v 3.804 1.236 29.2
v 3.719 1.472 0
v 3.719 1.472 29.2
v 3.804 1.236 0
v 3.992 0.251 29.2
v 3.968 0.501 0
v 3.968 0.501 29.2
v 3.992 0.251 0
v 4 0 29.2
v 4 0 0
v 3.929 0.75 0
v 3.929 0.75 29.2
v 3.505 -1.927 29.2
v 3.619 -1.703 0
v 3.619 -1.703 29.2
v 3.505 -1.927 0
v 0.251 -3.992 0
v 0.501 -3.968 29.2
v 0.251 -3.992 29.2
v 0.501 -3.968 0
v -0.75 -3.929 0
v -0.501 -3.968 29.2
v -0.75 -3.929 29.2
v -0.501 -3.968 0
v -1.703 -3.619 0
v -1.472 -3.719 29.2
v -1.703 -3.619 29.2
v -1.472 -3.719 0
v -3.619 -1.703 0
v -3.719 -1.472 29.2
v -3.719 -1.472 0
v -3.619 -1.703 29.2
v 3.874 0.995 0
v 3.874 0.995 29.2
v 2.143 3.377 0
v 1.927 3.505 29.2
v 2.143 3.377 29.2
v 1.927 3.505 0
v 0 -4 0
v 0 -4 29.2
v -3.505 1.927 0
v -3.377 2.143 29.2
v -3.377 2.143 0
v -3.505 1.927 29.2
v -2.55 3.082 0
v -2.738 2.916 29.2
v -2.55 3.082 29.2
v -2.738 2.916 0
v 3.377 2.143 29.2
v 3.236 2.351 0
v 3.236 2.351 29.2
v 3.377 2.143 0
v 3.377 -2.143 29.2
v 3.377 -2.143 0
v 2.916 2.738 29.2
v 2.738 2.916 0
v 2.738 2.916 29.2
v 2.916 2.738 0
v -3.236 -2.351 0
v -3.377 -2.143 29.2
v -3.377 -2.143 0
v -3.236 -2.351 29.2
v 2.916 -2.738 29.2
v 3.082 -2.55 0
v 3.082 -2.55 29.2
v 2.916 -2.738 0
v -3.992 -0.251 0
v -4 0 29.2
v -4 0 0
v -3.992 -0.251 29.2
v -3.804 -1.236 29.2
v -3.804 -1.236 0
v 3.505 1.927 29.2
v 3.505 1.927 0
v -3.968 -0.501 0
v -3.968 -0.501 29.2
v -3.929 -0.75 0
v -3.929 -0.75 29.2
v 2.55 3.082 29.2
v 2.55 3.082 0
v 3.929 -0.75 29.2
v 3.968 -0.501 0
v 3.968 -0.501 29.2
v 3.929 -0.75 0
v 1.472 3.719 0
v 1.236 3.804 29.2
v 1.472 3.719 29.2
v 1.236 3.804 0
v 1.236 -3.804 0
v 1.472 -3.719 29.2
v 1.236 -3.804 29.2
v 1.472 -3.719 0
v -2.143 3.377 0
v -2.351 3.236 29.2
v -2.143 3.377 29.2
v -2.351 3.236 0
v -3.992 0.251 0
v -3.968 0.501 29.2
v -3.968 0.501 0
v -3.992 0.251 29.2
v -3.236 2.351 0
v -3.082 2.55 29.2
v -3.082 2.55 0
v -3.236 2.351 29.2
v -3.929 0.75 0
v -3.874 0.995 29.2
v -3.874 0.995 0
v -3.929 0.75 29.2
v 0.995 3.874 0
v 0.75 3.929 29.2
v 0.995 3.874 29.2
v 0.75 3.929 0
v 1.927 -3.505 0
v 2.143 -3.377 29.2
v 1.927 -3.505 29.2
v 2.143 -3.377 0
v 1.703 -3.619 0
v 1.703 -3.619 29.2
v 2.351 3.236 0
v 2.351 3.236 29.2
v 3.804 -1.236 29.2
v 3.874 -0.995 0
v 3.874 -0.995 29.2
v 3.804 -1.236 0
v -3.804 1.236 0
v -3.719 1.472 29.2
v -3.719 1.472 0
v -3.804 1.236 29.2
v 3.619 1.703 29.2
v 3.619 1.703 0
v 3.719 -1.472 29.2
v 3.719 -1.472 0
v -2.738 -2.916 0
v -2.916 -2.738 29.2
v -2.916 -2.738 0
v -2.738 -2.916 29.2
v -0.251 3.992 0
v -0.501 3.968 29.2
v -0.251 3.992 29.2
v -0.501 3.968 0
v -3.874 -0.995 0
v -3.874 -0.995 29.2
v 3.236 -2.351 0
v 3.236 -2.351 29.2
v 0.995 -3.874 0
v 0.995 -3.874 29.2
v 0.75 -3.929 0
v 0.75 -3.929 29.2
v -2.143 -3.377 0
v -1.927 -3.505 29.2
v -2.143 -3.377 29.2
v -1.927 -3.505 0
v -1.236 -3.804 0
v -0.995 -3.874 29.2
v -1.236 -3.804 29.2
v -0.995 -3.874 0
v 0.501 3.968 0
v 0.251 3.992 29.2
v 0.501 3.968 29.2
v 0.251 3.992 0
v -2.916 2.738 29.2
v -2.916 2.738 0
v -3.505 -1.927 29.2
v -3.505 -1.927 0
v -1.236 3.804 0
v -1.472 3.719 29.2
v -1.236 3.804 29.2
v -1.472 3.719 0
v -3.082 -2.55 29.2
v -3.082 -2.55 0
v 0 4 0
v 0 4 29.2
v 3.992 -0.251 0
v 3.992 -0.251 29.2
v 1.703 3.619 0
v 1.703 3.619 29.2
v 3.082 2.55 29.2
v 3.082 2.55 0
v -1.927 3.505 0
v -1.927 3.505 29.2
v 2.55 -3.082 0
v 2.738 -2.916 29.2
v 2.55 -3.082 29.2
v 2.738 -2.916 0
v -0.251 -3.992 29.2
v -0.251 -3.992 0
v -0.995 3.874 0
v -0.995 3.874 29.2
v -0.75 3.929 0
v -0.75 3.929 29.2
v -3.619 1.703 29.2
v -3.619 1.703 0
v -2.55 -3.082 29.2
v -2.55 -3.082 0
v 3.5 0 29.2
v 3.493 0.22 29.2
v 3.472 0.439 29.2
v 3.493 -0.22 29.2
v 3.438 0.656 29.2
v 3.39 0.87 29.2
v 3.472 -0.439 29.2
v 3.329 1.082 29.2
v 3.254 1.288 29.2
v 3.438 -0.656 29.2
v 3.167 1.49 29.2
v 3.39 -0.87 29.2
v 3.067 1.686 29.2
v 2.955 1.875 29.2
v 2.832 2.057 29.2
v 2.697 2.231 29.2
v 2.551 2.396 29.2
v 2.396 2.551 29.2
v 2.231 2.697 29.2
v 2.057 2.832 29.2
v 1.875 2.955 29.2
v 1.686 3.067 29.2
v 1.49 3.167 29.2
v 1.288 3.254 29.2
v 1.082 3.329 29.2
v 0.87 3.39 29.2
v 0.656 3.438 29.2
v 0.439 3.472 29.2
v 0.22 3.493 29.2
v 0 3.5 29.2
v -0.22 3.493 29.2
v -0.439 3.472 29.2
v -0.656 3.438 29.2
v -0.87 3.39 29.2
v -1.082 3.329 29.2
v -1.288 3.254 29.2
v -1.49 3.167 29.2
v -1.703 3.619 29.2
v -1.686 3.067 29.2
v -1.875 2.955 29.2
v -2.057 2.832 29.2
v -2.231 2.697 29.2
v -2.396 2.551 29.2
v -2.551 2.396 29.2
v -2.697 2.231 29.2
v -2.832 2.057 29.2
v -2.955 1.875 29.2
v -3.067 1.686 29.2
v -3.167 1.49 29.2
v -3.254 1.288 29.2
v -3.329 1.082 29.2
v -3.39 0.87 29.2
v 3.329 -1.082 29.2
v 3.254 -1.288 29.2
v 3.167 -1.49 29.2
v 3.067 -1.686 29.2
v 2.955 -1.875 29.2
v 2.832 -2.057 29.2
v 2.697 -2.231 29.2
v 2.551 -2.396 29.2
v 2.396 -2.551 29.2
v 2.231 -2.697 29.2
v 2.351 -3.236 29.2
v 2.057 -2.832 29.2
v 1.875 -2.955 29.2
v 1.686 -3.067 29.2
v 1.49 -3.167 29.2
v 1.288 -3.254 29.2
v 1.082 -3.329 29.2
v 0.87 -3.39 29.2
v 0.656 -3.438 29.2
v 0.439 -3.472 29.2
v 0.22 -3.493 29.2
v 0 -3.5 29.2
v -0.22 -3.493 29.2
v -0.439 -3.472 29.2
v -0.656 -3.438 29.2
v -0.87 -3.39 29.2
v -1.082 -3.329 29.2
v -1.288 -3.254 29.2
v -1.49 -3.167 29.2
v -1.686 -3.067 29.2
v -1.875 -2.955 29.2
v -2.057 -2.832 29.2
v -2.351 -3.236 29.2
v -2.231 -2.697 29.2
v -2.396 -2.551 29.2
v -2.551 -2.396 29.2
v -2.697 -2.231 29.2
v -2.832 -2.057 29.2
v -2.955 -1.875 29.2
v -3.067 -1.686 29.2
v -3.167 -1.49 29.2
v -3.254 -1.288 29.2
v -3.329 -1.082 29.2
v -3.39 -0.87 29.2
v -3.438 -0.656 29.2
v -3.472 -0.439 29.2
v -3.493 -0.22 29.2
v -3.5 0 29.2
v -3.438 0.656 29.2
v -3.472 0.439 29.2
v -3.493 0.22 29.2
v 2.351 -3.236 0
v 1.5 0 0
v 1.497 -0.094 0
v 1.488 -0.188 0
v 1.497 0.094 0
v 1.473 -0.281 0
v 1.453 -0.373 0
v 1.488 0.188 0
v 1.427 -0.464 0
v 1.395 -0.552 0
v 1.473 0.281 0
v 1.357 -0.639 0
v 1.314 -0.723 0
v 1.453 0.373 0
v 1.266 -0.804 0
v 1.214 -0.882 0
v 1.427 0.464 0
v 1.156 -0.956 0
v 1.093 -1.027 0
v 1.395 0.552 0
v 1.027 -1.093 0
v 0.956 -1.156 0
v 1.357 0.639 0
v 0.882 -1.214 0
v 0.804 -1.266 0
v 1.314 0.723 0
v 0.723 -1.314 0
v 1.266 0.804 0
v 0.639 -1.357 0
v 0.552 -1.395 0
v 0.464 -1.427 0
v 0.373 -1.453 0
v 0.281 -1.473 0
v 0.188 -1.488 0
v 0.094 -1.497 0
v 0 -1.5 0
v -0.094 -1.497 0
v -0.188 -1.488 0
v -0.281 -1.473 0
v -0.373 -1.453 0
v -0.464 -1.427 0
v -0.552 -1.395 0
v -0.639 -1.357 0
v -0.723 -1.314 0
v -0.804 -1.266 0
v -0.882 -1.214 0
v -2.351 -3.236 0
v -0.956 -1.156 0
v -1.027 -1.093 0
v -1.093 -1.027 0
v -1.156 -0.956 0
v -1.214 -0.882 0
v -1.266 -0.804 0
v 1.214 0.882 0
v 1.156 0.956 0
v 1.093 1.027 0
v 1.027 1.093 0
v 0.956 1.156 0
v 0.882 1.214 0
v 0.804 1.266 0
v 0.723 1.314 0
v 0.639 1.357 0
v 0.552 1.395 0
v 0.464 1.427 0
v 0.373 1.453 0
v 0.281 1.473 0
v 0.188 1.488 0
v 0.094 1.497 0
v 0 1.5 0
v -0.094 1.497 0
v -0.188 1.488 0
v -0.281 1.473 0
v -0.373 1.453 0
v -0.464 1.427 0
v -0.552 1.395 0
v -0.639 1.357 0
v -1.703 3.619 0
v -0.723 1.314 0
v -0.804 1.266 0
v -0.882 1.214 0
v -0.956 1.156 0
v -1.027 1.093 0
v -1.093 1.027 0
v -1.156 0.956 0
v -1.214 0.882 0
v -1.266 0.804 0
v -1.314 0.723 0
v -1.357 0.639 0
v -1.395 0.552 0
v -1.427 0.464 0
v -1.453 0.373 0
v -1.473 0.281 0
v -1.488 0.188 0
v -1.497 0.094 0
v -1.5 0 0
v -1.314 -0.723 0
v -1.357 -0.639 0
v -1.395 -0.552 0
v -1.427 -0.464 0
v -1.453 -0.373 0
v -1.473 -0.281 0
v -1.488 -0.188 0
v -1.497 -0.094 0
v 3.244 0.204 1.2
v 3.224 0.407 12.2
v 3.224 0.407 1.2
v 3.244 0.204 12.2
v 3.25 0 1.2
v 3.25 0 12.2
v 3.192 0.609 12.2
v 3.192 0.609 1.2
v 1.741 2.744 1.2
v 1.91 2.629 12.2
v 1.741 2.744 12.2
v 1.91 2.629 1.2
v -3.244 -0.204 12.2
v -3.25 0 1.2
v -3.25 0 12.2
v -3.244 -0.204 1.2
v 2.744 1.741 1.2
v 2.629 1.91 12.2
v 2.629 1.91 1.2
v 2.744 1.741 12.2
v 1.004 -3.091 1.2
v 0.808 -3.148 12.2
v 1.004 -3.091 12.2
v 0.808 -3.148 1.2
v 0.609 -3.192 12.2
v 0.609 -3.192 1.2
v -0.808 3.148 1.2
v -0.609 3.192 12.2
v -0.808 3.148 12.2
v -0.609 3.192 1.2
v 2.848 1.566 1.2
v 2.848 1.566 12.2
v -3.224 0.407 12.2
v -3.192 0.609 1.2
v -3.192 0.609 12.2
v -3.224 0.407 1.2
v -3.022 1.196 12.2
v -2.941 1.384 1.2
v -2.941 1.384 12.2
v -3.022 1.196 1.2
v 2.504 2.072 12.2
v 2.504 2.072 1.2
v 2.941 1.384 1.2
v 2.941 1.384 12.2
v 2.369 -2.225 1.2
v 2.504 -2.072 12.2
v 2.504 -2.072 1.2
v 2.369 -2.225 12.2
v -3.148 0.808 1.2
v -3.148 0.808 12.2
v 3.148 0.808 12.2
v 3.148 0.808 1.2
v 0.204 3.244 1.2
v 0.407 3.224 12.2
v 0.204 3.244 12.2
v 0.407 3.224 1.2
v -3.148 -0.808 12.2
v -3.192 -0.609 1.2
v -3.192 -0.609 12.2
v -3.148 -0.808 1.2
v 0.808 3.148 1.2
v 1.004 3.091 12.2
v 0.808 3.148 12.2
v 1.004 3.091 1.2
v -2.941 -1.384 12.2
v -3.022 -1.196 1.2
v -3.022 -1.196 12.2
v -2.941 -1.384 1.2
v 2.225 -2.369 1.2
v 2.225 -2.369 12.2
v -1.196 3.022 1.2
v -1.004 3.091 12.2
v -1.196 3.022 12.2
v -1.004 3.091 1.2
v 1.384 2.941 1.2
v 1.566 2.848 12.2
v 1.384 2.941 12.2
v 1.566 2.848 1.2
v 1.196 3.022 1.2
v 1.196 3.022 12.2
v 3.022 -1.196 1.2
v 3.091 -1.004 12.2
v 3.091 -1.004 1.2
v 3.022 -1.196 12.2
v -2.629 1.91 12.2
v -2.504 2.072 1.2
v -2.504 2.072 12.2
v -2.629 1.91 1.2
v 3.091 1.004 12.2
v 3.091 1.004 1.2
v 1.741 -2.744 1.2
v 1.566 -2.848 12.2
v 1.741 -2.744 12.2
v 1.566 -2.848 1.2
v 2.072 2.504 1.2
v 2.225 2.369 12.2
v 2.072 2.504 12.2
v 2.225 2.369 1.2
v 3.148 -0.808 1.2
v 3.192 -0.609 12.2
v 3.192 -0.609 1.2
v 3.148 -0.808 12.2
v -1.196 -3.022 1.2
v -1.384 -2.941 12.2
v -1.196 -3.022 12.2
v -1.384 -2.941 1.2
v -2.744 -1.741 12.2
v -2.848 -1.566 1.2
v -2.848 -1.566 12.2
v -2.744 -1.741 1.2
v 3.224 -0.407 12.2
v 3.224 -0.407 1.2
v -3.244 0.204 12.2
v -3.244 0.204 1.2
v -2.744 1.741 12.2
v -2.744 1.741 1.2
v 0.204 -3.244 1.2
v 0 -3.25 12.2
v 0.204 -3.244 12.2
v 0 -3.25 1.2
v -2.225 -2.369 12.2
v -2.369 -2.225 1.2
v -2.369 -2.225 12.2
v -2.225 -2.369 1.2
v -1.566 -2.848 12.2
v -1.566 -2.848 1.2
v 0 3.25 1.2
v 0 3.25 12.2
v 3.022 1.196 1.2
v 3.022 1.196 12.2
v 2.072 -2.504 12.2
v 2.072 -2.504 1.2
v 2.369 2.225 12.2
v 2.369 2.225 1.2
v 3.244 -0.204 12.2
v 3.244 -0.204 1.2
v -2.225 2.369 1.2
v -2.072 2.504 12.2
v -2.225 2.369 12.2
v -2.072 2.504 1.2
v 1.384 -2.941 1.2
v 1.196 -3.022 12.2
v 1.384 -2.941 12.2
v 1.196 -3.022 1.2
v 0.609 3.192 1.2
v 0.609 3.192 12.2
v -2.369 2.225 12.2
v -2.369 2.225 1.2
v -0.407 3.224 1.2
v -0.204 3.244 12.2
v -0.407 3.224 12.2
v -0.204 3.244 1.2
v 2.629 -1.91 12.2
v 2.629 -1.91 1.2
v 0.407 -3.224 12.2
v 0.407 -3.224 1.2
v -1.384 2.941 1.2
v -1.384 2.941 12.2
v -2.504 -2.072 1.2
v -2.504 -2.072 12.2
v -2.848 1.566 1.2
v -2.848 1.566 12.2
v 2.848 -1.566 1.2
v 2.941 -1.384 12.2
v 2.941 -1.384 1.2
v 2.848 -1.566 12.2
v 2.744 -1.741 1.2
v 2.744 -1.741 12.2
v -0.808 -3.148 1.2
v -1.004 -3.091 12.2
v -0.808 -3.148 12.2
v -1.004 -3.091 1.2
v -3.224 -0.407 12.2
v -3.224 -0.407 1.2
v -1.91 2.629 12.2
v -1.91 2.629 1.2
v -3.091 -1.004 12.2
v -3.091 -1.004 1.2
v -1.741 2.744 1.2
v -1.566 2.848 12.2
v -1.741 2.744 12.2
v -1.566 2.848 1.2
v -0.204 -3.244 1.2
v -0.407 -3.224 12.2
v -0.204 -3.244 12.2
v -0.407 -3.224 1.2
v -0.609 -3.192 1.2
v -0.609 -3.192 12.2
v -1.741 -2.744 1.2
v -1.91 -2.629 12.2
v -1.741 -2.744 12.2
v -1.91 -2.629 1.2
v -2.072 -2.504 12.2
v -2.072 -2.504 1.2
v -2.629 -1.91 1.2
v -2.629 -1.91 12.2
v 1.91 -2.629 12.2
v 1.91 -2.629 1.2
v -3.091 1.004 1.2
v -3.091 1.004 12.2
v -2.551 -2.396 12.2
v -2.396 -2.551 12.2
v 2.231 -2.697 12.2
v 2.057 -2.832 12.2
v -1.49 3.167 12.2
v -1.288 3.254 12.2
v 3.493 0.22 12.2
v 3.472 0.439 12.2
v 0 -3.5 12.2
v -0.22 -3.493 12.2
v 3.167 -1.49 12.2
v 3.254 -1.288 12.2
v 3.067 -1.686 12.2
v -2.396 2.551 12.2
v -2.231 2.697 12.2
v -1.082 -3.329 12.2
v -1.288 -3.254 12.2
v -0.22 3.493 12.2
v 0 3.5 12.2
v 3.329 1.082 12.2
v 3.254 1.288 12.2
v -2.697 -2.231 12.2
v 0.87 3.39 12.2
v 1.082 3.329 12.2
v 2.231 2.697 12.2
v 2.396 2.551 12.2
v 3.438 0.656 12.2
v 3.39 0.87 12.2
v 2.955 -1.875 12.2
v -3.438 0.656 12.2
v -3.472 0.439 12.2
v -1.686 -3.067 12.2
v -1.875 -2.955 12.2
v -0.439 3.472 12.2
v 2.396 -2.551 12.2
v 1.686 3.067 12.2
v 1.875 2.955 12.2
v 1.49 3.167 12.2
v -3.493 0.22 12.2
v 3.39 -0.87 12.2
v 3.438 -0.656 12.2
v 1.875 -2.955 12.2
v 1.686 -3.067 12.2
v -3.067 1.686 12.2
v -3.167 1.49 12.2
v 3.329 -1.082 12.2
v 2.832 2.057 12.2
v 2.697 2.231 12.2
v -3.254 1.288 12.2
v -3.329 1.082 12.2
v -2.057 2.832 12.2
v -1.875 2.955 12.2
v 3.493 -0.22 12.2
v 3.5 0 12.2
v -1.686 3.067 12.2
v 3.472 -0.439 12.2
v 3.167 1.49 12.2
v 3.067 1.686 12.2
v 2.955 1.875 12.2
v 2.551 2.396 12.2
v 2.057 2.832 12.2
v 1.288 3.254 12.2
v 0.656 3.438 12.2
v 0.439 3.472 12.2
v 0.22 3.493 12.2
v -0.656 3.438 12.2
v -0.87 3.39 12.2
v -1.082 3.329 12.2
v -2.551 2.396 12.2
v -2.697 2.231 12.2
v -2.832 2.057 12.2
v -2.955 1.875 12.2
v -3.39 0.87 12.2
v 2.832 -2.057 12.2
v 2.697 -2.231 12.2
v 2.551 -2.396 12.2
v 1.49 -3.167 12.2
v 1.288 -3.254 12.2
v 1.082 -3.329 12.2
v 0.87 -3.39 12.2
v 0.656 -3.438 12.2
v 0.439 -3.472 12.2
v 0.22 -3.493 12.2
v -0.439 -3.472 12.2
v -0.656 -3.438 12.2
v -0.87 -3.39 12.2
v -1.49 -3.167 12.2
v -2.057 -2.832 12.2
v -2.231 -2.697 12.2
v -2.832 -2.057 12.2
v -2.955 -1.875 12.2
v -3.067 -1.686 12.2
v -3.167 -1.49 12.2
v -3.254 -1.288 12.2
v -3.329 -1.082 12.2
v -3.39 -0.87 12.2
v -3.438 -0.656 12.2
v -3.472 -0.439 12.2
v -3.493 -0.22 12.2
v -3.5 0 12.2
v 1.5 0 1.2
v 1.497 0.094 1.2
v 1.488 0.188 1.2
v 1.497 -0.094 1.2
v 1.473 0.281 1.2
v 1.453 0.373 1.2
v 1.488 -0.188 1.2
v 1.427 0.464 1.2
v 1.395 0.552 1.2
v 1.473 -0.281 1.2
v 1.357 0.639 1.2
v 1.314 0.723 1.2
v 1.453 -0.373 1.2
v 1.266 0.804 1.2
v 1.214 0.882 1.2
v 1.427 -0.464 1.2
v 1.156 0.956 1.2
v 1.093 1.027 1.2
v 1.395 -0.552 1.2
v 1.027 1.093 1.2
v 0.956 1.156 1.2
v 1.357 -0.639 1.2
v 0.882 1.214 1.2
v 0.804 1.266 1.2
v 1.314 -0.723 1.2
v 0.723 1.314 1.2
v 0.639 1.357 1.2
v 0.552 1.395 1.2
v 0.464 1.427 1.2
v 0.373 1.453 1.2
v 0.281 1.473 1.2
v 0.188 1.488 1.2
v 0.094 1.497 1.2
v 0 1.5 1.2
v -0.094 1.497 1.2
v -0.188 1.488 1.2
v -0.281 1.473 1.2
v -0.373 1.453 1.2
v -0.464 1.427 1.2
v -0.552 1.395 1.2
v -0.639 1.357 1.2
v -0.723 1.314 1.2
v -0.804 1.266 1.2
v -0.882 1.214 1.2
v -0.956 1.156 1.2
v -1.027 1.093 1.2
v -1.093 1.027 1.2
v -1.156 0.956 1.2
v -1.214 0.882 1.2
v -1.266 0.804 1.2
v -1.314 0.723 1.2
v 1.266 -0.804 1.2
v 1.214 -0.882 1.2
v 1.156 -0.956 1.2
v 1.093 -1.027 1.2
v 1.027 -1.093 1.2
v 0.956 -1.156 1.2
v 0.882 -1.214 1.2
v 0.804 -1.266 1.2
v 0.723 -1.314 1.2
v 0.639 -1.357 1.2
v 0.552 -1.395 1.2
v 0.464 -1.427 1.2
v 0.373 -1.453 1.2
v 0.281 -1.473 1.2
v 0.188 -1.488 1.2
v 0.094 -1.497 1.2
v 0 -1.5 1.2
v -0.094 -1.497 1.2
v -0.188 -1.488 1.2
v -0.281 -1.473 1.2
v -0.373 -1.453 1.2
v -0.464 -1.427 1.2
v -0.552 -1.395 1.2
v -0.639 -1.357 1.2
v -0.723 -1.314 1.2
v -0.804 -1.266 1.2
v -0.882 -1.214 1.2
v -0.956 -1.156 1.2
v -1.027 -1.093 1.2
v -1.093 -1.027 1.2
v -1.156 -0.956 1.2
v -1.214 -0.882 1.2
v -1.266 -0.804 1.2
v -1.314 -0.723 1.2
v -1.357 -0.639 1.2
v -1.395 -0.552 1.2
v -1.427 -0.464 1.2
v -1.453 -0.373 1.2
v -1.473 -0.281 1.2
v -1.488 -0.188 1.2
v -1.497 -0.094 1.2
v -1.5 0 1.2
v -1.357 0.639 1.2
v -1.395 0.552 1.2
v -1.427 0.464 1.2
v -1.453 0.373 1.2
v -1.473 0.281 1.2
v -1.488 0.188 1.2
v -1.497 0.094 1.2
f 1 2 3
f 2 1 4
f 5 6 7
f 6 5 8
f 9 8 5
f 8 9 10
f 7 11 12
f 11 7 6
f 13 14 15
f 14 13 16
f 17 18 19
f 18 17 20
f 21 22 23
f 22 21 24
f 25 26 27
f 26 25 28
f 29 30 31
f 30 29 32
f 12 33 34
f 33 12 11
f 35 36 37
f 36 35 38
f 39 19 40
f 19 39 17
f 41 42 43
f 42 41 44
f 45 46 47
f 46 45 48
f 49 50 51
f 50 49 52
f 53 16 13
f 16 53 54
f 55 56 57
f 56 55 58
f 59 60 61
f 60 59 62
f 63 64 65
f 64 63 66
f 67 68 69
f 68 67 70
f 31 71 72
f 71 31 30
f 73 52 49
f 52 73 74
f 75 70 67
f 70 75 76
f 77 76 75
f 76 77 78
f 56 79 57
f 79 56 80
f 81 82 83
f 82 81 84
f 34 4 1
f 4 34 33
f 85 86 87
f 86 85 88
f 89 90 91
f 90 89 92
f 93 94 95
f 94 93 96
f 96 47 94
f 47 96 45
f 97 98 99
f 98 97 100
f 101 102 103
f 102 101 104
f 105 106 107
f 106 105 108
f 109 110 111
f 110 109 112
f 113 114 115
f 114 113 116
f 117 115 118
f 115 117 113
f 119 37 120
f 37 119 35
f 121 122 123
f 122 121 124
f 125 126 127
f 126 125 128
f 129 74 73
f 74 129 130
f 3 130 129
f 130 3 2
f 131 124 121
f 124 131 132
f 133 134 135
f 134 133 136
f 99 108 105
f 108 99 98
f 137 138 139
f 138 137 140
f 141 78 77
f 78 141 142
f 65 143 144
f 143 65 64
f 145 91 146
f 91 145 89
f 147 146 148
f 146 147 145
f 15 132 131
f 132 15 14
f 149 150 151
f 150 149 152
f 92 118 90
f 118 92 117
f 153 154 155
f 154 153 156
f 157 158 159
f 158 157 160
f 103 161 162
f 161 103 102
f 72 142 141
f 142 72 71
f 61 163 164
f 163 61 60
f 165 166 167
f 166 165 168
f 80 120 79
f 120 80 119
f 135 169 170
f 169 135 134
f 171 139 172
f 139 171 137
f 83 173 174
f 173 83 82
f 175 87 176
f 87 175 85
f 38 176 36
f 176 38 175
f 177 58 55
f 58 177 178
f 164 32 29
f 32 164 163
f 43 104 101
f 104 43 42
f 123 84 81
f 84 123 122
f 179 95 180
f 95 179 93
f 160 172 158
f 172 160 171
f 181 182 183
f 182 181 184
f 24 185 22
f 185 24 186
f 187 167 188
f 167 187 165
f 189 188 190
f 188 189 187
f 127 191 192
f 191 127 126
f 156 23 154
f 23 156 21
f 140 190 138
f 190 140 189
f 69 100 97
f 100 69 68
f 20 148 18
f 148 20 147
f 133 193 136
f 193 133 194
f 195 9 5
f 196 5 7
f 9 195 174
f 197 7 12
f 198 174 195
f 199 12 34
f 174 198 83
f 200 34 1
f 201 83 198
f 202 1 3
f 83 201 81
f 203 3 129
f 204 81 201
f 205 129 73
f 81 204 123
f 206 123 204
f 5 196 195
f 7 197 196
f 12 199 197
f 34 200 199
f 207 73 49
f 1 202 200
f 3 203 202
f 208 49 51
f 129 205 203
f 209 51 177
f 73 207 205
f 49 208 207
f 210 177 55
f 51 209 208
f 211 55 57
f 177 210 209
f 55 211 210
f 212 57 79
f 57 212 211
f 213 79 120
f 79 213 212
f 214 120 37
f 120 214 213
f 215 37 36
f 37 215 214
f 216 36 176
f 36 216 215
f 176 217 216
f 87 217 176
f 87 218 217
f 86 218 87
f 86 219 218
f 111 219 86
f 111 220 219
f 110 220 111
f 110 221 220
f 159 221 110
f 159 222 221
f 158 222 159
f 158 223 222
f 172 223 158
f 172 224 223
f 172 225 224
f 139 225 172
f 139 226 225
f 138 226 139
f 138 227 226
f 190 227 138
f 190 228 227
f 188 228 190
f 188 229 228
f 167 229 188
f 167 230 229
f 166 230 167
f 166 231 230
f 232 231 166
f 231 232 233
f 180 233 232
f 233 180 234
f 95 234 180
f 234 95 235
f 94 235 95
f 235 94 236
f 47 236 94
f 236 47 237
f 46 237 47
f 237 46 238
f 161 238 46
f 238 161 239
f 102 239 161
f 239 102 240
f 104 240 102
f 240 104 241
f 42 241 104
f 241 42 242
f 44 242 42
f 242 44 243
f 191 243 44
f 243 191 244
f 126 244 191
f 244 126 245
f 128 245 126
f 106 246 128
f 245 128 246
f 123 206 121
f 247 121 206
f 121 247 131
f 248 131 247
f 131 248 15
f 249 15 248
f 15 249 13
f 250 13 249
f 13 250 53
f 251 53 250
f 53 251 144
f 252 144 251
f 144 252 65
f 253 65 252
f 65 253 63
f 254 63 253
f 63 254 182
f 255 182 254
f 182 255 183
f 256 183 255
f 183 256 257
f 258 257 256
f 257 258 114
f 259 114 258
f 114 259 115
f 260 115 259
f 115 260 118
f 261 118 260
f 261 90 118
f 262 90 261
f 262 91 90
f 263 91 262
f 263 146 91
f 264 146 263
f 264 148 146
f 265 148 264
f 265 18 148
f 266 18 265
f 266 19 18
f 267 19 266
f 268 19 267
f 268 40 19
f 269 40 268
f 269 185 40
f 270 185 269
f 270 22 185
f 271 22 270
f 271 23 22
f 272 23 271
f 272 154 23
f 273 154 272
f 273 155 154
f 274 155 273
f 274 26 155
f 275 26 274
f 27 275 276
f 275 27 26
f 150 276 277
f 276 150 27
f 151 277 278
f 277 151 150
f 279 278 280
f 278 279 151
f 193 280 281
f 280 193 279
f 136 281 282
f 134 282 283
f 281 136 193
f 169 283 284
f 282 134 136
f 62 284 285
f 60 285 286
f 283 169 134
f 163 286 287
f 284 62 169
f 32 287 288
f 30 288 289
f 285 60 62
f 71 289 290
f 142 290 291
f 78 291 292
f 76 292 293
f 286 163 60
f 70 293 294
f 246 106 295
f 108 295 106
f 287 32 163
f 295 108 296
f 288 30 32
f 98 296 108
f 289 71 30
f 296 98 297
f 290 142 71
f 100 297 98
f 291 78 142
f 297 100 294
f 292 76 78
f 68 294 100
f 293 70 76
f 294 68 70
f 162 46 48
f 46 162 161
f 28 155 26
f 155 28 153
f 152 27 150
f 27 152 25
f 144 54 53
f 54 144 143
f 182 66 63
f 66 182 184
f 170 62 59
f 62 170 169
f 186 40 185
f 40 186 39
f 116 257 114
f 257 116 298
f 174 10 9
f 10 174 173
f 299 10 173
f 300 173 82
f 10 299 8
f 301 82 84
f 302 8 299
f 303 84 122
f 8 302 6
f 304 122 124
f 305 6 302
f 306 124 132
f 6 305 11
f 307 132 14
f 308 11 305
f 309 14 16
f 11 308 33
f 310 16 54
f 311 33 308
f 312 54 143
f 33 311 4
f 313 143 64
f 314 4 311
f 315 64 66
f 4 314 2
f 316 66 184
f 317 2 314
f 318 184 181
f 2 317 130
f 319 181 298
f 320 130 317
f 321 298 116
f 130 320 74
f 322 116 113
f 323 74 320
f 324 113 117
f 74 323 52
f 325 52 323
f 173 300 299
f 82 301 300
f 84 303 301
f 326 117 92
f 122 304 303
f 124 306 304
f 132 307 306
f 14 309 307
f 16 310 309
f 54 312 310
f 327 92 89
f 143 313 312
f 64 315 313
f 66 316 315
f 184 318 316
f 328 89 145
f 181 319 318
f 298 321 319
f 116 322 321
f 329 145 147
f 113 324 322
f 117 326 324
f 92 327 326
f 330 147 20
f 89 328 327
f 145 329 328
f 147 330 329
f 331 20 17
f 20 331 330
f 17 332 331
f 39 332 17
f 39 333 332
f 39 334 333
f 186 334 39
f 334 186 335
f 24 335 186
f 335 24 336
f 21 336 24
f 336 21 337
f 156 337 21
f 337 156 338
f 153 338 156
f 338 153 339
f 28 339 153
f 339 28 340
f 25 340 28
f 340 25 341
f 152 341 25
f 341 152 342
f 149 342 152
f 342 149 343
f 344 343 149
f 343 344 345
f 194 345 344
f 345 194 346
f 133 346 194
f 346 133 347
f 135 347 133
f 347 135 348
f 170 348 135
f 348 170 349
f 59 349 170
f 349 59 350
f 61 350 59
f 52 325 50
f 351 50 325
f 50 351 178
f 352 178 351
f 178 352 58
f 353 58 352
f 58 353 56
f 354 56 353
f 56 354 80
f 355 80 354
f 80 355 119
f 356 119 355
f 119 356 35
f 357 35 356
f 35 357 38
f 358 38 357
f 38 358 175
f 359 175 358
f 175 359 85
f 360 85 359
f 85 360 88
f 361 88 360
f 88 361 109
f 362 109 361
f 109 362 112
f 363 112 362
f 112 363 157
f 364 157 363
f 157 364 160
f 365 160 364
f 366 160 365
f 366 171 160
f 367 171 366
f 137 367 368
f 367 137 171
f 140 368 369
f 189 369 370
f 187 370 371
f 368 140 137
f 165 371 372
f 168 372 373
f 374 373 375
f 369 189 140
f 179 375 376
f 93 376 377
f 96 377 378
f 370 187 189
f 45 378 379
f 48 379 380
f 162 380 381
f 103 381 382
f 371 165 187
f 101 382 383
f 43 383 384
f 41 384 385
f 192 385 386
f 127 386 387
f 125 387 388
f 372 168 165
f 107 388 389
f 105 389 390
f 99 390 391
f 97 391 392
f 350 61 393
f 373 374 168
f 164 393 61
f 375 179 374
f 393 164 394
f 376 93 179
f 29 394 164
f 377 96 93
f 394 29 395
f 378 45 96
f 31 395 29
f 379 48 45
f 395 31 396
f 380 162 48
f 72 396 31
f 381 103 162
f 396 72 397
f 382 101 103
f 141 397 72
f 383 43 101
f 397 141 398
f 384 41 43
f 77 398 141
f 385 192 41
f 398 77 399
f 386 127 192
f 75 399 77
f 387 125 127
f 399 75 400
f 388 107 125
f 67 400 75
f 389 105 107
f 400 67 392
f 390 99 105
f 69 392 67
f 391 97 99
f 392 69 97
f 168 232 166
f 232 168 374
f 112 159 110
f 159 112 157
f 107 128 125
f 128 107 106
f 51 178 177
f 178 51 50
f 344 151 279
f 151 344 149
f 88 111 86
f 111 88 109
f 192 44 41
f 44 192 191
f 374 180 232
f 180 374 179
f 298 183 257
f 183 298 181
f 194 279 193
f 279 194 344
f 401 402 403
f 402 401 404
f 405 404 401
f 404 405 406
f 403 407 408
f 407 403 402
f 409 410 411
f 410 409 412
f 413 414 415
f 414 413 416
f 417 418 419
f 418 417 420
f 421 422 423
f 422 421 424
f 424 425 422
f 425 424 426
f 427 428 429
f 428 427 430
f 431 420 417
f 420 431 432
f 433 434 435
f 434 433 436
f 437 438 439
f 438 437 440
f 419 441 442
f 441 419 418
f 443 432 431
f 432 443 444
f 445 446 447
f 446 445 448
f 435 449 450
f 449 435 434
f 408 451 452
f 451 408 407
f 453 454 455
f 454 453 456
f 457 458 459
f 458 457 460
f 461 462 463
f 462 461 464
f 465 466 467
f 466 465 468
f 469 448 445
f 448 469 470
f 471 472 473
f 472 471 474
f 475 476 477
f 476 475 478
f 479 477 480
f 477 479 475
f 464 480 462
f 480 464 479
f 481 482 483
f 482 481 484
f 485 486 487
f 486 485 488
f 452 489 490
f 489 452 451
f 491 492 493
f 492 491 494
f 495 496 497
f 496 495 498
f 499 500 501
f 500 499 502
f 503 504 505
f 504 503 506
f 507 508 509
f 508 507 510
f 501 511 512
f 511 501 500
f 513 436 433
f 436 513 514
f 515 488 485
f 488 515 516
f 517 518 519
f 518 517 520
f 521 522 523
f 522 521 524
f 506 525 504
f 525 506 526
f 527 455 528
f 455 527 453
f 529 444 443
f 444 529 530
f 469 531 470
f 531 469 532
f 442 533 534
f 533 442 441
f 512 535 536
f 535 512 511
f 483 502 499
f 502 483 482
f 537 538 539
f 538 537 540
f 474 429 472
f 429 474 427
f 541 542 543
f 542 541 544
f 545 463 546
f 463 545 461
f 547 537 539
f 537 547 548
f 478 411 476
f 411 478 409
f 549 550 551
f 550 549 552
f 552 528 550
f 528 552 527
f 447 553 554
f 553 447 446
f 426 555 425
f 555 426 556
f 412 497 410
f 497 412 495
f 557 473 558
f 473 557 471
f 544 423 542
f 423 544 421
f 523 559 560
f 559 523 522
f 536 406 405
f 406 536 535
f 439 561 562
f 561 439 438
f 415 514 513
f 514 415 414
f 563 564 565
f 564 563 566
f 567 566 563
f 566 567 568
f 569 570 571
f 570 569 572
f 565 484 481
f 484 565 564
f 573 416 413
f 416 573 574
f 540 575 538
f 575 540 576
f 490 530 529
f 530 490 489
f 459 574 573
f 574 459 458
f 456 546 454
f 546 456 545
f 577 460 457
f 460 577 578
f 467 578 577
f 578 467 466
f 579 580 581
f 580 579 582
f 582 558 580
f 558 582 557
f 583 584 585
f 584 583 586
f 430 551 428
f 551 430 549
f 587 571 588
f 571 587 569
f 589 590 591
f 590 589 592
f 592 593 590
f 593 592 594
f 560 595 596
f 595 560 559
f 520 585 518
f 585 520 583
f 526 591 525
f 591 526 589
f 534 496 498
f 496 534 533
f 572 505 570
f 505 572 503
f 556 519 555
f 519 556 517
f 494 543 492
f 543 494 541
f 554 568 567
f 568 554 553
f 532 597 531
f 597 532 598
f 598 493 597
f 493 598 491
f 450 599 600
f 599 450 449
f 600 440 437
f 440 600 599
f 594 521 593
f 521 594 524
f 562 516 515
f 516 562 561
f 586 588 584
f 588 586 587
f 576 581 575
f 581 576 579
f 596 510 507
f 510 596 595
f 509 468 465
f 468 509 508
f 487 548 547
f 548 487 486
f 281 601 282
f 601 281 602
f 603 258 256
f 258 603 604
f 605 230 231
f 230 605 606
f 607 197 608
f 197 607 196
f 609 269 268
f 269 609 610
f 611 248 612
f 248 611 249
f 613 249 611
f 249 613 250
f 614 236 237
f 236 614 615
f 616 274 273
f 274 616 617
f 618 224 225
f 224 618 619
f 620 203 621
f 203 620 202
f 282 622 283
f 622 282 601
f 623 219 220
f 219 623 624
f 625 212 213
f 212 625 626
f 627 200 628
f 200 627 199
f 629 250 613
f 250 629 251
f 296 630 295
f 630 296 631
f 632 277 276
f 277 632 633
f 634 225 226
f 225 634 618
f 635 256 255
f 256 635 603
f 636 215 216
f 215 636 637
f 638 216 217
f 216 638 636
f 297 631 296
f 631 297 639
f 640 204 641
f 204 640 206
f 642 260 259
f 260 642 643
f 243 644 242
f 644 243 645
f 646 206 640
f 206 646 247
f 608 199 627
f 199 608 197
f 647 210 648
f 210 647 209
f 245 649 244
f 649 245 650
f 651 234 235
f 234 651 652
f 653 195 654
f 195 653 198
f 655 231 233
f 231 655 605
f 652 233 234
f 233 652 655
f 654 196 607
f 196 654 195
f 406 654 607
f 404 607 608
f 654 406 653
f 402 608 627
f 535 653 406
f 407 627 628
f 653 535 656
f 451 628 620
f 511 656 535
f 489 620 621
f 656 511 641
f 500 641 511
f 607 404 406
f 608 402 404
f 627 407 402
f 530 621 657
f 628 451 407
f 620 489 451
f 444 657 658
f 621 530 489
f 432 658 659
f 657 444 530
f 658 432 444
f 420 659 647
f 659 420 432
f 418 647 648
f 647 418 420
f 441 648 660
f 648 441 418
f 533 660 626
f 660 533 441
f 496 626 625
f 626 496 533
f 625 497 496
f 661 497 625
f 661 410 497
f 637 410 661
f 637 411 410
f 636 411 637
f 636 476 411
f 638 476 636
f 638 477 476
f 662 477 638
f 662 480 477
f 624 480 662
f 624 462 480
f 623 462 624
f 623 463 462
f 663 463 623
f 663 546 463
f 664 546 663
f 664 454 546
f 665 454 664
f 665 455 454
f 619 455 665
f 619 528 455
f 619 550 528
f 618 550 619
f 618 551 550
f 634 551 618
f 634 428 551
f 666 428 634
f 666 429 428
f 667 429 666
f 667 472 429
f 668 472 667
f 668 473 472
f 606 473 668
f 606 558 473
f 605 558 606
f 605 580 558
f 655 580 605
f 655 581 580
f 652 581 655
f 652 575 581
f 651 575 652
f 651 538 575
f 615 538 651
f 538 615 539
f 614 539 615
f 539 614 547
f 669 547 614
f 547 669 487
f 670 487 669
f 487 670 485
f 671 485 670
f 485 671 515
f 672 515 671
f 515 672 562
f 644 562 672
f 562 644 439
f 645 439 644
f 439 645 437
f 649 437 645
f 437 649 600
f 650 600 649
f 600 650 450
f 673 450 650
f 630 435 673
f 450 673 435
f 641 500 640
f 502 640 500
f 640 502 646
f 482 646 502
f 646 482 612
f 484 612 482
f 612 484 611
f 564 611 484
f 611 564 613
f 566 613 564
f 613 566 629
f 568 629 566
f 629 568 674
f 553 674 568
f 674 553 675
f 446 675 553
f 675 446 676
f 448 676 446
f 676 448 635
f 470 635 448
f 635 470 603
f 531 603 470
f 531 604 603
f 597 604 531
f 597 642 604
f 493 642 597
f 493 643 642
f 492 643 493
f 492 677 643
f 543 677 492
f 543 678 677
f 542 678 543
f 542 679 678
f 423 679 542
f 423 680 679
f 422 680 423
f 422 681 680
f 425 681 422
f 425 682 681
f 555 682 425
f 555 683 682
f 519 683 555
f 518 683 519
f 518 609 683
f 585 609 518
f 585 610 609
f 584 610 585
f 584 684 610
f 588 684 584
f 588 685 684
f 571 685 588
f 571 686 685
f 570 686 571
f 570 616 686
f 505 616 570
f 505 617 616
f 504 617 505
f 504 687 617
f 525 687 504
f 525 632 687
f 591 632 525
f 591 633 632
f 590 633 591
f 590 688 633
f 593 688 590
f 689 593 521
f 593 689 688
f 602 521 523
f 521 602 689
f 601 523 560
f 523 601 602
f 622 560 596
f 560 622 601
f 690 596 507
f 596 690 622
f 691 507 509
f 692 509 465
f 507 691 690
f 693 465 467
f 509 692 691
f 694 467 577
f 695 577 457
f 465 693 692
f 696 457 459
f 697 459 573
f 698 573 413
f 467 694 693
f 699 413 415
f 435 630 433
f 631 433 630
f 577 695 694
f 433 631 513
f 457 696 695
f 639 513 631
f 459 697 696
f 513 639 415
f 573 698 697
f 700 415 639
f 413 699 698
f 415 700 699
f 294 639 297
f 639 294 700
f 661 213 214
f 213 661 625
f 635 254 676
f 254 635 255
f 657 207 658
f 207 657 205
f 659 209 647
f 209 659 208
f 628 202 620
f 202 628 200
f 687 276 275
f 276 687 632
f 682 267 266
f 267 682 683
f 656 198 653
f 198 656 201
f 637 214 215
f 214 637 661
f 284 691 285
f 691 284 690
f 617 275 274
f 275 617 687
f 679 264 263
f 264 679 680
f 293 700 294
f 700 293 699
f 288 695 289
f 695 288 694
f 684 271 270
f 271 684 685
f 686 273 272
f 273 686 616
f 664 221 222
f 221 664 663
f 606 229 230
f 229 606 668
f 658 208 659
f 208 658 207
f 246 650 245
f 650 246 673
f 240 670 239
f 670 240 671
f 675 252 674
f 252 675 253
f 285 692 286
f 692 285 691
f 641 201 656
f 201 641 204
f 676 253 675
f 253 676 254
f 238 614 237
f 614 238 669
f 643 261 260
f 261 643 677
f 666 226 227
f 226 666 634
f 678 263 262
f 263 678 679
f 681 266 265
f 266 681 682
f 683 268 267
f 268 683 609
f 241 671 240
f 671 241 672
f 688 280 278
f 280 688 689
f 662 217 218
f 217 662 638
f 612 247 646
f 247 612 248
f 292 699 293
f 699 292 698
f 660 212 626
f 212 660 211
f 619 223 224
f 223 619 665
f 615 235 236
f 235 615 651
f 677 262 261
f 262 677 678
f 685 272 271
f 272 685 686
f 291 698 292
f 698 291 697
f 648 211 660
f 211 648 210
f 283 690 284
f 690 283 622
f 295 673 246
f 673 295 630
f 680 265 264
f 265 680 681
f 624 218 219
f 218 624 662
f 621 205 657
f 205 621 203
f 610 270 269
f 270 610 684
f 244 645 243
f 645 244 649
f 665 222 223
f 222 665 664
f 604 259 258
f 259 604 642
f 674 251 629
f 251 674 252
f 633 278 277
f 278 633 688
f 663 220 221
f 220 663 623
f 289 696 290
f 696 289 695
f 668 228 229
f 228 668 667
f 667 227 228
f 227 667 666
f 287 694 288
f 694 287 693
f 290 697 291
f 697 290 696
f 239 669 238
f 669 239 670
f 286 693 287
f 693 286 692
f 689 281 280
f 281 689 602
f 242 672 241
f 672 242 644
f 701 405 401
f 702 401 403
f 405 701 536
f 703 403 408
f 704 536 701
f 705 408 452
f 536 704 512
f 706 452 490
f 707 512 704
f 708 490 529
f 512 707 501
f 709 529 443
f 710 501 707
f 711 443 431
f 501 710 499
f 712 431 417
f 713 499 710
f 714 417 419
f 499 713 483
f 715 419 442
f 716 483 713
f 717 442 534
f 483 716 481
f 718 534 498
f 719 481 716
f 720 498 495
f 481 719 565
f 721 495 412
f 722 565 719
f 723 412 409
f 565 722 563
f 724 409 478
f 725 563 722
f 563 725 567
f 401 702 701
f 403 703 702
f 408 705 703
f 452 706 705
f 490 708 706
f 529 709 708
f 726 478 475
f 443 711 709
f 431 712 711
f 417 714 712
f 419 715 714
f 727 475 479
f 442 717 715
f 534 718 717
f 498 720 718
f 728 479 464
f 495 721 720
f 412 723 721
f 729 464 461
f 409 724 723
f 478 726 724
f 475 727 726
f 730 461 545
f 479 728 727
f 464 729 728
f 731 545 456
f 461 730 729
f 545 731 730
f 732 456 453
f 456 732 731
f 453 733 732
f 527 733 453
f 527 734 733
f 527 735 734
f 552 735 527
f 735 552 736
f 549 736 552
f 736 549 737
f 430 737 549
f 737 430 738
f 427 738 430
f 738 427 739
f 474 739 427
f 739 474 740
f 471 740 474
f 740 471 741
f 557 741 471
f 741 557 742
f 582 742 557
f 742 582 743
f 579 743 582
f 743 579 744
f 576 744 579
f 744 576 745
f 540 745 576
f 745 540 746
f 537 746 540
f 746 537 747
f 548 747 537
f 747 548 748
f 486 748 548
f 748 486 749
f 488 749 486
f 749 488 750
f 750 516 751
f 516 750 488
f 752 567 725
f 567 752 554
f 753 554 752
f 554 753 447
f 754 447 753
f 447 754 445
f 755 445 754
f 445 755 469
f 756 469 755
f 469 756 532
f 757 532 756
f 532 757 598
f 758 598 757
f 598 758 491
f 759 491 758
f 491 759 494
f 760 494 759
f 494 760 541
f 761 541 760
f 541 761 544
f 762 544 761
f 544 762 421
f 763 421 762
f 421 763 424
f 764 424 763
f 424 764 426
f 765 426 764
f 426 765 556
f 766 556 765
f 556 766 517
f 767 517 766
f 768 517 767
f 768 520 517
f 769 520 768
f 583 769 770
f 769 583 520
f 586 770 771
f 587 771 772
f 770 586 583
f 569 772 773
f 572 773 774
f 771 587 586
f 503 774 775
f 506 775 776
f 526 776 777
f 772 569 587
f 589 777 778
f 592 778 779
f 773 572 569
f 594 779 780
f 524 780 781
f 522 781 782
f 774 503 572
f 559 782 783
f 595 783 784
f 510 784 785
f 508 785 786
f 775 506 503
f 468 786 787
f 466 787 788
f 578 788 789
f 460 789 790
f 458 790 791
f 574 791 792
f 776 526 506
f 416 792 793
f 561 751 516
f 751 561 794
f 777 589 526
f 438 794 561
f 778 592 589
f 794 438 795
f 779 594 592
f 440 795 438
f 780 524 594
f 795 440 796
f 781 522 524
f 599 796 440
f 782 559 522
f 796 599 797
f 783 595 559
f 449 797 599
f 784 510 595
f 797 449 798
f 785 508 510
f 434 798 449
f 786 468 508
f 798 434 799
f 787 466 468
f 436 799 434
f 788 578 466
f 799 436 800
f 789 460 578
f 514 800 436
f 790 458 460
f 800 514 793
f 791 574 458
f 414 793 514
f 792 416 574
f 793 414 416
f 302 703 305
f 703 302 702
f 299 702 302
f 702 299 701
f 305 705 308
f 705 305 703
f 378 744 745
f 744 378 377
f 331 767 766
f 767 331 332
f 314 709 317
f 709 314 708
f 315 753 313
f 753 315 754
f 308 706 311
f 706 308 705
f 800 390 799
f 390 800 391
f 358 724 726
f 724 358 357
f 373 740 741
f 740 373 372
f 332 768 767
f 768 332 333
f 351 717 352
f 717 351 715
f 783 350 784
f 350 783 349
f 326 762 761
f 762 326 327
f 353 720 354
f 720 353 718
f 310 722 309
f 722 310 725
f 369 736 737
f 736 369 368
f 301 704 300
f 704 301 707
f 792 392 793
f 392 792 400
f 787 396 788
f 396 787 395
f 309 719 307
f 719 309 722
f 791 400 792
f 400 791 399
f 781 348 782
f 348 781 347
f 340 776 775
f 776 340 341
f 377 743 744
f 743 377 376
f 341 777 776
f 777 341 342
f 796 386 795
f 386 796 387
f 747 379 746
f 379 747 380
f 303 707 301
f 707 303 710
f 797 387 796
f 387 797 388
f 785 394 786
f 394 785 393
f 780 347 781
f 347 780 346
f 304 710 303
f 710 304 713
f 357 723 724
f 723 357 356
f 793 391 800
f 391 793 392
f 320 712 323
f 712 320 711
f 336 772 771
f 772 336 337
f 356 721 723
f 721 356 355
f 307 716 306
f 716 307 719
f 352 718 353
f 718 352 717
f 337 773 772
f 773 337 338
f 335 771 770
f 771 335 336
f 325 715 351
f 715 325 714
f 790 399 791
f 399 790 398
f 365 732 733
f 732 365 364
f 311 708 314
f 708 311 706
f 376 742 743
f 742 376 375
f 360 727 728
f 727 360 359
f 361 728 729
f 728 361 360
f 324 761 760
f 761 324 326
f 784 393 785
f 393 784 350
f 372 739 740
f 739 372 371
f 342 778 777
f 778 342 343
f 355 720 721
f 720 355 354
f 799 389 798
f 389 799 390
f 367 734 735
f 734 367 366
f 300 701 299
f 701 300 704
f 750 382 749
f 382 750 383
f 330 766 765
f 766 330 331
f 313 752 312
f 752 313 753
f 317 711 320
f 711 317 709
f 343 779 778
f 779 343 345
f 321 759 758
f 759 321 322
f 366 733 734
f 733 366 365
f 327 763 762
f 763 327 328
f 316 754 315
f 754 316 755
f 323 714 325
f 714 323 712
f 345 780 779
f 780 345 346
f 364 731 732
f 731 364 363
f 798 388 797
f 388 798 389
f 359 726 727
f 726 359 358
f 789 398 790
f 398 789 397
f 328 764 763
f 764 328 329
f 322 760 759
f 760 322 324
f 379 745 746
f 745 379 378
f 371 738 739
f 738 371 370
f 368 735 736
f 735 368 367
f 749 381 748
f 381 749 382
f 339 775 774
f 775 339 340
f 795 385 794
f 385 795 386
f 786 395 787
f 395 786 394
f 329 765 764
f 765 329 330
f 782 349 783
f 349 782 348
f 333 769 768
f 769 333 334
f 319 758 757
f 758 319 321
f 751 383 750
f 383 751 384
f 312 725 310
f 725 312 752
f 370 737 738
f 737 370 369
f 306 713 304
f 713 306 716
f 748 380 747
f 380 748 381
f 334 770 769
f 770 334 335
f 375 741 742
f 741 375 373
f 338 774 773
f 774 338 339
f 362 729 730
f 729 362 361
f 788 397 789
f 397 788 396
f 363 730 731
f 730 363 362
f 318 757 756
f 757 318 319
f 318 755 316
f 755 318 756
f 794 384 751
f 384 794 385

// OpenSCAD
// CSG.scad - Basic example of CSG usage
$fn=100;
INCH=25.4;

Vytah_prumer=INCH*1.25;    // prumer okularoveho vytahu
Posun_pruzoru=0;          // posun pruzoru pro odecitani ze stupnice
Tloustka_sten=3.2;

//Rozmery sroubu a matky pro M3 [mm]
M3_screw_diameter = 3.2;                //prumer sroubu (zavit)
M3_screw_head_height = 3;               //vyska hlavy sroubu
M3_nut_height = 2.7;                    //vyska matky
M3_nut_diameter = 6.6;                  //prumer matky (kruznice opsana)
M3_screw_head_diameter = 6.6;           //prumer hlavy sroubu

// Polomery (osa x,y)
r1=Vytah_prumer/2;      // polomer okularoveho vytahu
r2=r1+3;                // polomer kolimatoru
r3=r1-3.2;    // polomer vzreyu v horni casti kolimatoru
r4=3;                   // polomer pruzoru pro laser
r5=5;                   // polomer dutiny na ulozeni pouzdra diody
r6=10.5+1.5;            // polomer ulozeni baterie
r10=r2-2-2;           //polomer volne plochy (baterie/vicko)
r11=r2-2;             //polomer ulozeni vicka

// Polomery (rovina x,y)
r7=M3_nut_diameter/2;         // polomer matky
r8=M3_screw_diameter/2;       // polomer soubu
r9=M3_screw_head_diameter/2;  // polomer hlavy soubu

// Oblast vicka
v=M3_screw_head_diameter+4;  //vyska pro ulozeni vicka
h11=v;

// Bateriove pouzdro
b=10+v;                       // vyska prostoru mezi baterii a vyckem
p6=b+15;                       // vyska rozsireni pro ulozeni baterie
h10=p6-4;

// Dioda
led=20;                        // vyska led diody
draty=10;                      // vyska prostoru na draty
stena=1.2;                      //tloustka spodni steny ulozeni diody
p5=p6+stena+led+draty;         // vyska rozsileni pro ulozeni diody
rd=3;                            //polomer diody


// Vyska tela
h2=r2+r1+p5;              // vyska kolimatoru bez okularoveho vytahu
h1=h2+25;                   // vyska kolimatoru

// Predefinovane vysky
z1=h2-r2-Posun_pruzoru;     // vyska stredu otvoru pro odecitani ze stupnice

// Vyska (kolimacni srouby)
h7=r5+3.5;                    // poloha dna pro matku
h8=20;                      // delka pruzoru pro sroub
h9=1.8;                       // vyska ulozeni pro hlavu sroubu

// Kostka
a1=(4*(z1))/(sqrt(2));      // delka hrany kostky (pruzor kolimatoru)
a2=40;
a3=40;

//Srouby pro kolimaci   
srouby=3;
dno=6;
h12=v+dno+10;
h13=20;

//Ulozeni diody

difference() {
    cylinder(r=r5-1,h=stena+led+draty-2);               
    cylinder(r=rd+0.25,h=20);
    translate([0,0,stena+11])
        cylinder(r=rd+0.5,h=20);
    
}
difference() {
    cylinder(r=r5-1,h=stena);
    cylinder(r=1.5,h=20);
    }
    
echo("r5",r5);
    
